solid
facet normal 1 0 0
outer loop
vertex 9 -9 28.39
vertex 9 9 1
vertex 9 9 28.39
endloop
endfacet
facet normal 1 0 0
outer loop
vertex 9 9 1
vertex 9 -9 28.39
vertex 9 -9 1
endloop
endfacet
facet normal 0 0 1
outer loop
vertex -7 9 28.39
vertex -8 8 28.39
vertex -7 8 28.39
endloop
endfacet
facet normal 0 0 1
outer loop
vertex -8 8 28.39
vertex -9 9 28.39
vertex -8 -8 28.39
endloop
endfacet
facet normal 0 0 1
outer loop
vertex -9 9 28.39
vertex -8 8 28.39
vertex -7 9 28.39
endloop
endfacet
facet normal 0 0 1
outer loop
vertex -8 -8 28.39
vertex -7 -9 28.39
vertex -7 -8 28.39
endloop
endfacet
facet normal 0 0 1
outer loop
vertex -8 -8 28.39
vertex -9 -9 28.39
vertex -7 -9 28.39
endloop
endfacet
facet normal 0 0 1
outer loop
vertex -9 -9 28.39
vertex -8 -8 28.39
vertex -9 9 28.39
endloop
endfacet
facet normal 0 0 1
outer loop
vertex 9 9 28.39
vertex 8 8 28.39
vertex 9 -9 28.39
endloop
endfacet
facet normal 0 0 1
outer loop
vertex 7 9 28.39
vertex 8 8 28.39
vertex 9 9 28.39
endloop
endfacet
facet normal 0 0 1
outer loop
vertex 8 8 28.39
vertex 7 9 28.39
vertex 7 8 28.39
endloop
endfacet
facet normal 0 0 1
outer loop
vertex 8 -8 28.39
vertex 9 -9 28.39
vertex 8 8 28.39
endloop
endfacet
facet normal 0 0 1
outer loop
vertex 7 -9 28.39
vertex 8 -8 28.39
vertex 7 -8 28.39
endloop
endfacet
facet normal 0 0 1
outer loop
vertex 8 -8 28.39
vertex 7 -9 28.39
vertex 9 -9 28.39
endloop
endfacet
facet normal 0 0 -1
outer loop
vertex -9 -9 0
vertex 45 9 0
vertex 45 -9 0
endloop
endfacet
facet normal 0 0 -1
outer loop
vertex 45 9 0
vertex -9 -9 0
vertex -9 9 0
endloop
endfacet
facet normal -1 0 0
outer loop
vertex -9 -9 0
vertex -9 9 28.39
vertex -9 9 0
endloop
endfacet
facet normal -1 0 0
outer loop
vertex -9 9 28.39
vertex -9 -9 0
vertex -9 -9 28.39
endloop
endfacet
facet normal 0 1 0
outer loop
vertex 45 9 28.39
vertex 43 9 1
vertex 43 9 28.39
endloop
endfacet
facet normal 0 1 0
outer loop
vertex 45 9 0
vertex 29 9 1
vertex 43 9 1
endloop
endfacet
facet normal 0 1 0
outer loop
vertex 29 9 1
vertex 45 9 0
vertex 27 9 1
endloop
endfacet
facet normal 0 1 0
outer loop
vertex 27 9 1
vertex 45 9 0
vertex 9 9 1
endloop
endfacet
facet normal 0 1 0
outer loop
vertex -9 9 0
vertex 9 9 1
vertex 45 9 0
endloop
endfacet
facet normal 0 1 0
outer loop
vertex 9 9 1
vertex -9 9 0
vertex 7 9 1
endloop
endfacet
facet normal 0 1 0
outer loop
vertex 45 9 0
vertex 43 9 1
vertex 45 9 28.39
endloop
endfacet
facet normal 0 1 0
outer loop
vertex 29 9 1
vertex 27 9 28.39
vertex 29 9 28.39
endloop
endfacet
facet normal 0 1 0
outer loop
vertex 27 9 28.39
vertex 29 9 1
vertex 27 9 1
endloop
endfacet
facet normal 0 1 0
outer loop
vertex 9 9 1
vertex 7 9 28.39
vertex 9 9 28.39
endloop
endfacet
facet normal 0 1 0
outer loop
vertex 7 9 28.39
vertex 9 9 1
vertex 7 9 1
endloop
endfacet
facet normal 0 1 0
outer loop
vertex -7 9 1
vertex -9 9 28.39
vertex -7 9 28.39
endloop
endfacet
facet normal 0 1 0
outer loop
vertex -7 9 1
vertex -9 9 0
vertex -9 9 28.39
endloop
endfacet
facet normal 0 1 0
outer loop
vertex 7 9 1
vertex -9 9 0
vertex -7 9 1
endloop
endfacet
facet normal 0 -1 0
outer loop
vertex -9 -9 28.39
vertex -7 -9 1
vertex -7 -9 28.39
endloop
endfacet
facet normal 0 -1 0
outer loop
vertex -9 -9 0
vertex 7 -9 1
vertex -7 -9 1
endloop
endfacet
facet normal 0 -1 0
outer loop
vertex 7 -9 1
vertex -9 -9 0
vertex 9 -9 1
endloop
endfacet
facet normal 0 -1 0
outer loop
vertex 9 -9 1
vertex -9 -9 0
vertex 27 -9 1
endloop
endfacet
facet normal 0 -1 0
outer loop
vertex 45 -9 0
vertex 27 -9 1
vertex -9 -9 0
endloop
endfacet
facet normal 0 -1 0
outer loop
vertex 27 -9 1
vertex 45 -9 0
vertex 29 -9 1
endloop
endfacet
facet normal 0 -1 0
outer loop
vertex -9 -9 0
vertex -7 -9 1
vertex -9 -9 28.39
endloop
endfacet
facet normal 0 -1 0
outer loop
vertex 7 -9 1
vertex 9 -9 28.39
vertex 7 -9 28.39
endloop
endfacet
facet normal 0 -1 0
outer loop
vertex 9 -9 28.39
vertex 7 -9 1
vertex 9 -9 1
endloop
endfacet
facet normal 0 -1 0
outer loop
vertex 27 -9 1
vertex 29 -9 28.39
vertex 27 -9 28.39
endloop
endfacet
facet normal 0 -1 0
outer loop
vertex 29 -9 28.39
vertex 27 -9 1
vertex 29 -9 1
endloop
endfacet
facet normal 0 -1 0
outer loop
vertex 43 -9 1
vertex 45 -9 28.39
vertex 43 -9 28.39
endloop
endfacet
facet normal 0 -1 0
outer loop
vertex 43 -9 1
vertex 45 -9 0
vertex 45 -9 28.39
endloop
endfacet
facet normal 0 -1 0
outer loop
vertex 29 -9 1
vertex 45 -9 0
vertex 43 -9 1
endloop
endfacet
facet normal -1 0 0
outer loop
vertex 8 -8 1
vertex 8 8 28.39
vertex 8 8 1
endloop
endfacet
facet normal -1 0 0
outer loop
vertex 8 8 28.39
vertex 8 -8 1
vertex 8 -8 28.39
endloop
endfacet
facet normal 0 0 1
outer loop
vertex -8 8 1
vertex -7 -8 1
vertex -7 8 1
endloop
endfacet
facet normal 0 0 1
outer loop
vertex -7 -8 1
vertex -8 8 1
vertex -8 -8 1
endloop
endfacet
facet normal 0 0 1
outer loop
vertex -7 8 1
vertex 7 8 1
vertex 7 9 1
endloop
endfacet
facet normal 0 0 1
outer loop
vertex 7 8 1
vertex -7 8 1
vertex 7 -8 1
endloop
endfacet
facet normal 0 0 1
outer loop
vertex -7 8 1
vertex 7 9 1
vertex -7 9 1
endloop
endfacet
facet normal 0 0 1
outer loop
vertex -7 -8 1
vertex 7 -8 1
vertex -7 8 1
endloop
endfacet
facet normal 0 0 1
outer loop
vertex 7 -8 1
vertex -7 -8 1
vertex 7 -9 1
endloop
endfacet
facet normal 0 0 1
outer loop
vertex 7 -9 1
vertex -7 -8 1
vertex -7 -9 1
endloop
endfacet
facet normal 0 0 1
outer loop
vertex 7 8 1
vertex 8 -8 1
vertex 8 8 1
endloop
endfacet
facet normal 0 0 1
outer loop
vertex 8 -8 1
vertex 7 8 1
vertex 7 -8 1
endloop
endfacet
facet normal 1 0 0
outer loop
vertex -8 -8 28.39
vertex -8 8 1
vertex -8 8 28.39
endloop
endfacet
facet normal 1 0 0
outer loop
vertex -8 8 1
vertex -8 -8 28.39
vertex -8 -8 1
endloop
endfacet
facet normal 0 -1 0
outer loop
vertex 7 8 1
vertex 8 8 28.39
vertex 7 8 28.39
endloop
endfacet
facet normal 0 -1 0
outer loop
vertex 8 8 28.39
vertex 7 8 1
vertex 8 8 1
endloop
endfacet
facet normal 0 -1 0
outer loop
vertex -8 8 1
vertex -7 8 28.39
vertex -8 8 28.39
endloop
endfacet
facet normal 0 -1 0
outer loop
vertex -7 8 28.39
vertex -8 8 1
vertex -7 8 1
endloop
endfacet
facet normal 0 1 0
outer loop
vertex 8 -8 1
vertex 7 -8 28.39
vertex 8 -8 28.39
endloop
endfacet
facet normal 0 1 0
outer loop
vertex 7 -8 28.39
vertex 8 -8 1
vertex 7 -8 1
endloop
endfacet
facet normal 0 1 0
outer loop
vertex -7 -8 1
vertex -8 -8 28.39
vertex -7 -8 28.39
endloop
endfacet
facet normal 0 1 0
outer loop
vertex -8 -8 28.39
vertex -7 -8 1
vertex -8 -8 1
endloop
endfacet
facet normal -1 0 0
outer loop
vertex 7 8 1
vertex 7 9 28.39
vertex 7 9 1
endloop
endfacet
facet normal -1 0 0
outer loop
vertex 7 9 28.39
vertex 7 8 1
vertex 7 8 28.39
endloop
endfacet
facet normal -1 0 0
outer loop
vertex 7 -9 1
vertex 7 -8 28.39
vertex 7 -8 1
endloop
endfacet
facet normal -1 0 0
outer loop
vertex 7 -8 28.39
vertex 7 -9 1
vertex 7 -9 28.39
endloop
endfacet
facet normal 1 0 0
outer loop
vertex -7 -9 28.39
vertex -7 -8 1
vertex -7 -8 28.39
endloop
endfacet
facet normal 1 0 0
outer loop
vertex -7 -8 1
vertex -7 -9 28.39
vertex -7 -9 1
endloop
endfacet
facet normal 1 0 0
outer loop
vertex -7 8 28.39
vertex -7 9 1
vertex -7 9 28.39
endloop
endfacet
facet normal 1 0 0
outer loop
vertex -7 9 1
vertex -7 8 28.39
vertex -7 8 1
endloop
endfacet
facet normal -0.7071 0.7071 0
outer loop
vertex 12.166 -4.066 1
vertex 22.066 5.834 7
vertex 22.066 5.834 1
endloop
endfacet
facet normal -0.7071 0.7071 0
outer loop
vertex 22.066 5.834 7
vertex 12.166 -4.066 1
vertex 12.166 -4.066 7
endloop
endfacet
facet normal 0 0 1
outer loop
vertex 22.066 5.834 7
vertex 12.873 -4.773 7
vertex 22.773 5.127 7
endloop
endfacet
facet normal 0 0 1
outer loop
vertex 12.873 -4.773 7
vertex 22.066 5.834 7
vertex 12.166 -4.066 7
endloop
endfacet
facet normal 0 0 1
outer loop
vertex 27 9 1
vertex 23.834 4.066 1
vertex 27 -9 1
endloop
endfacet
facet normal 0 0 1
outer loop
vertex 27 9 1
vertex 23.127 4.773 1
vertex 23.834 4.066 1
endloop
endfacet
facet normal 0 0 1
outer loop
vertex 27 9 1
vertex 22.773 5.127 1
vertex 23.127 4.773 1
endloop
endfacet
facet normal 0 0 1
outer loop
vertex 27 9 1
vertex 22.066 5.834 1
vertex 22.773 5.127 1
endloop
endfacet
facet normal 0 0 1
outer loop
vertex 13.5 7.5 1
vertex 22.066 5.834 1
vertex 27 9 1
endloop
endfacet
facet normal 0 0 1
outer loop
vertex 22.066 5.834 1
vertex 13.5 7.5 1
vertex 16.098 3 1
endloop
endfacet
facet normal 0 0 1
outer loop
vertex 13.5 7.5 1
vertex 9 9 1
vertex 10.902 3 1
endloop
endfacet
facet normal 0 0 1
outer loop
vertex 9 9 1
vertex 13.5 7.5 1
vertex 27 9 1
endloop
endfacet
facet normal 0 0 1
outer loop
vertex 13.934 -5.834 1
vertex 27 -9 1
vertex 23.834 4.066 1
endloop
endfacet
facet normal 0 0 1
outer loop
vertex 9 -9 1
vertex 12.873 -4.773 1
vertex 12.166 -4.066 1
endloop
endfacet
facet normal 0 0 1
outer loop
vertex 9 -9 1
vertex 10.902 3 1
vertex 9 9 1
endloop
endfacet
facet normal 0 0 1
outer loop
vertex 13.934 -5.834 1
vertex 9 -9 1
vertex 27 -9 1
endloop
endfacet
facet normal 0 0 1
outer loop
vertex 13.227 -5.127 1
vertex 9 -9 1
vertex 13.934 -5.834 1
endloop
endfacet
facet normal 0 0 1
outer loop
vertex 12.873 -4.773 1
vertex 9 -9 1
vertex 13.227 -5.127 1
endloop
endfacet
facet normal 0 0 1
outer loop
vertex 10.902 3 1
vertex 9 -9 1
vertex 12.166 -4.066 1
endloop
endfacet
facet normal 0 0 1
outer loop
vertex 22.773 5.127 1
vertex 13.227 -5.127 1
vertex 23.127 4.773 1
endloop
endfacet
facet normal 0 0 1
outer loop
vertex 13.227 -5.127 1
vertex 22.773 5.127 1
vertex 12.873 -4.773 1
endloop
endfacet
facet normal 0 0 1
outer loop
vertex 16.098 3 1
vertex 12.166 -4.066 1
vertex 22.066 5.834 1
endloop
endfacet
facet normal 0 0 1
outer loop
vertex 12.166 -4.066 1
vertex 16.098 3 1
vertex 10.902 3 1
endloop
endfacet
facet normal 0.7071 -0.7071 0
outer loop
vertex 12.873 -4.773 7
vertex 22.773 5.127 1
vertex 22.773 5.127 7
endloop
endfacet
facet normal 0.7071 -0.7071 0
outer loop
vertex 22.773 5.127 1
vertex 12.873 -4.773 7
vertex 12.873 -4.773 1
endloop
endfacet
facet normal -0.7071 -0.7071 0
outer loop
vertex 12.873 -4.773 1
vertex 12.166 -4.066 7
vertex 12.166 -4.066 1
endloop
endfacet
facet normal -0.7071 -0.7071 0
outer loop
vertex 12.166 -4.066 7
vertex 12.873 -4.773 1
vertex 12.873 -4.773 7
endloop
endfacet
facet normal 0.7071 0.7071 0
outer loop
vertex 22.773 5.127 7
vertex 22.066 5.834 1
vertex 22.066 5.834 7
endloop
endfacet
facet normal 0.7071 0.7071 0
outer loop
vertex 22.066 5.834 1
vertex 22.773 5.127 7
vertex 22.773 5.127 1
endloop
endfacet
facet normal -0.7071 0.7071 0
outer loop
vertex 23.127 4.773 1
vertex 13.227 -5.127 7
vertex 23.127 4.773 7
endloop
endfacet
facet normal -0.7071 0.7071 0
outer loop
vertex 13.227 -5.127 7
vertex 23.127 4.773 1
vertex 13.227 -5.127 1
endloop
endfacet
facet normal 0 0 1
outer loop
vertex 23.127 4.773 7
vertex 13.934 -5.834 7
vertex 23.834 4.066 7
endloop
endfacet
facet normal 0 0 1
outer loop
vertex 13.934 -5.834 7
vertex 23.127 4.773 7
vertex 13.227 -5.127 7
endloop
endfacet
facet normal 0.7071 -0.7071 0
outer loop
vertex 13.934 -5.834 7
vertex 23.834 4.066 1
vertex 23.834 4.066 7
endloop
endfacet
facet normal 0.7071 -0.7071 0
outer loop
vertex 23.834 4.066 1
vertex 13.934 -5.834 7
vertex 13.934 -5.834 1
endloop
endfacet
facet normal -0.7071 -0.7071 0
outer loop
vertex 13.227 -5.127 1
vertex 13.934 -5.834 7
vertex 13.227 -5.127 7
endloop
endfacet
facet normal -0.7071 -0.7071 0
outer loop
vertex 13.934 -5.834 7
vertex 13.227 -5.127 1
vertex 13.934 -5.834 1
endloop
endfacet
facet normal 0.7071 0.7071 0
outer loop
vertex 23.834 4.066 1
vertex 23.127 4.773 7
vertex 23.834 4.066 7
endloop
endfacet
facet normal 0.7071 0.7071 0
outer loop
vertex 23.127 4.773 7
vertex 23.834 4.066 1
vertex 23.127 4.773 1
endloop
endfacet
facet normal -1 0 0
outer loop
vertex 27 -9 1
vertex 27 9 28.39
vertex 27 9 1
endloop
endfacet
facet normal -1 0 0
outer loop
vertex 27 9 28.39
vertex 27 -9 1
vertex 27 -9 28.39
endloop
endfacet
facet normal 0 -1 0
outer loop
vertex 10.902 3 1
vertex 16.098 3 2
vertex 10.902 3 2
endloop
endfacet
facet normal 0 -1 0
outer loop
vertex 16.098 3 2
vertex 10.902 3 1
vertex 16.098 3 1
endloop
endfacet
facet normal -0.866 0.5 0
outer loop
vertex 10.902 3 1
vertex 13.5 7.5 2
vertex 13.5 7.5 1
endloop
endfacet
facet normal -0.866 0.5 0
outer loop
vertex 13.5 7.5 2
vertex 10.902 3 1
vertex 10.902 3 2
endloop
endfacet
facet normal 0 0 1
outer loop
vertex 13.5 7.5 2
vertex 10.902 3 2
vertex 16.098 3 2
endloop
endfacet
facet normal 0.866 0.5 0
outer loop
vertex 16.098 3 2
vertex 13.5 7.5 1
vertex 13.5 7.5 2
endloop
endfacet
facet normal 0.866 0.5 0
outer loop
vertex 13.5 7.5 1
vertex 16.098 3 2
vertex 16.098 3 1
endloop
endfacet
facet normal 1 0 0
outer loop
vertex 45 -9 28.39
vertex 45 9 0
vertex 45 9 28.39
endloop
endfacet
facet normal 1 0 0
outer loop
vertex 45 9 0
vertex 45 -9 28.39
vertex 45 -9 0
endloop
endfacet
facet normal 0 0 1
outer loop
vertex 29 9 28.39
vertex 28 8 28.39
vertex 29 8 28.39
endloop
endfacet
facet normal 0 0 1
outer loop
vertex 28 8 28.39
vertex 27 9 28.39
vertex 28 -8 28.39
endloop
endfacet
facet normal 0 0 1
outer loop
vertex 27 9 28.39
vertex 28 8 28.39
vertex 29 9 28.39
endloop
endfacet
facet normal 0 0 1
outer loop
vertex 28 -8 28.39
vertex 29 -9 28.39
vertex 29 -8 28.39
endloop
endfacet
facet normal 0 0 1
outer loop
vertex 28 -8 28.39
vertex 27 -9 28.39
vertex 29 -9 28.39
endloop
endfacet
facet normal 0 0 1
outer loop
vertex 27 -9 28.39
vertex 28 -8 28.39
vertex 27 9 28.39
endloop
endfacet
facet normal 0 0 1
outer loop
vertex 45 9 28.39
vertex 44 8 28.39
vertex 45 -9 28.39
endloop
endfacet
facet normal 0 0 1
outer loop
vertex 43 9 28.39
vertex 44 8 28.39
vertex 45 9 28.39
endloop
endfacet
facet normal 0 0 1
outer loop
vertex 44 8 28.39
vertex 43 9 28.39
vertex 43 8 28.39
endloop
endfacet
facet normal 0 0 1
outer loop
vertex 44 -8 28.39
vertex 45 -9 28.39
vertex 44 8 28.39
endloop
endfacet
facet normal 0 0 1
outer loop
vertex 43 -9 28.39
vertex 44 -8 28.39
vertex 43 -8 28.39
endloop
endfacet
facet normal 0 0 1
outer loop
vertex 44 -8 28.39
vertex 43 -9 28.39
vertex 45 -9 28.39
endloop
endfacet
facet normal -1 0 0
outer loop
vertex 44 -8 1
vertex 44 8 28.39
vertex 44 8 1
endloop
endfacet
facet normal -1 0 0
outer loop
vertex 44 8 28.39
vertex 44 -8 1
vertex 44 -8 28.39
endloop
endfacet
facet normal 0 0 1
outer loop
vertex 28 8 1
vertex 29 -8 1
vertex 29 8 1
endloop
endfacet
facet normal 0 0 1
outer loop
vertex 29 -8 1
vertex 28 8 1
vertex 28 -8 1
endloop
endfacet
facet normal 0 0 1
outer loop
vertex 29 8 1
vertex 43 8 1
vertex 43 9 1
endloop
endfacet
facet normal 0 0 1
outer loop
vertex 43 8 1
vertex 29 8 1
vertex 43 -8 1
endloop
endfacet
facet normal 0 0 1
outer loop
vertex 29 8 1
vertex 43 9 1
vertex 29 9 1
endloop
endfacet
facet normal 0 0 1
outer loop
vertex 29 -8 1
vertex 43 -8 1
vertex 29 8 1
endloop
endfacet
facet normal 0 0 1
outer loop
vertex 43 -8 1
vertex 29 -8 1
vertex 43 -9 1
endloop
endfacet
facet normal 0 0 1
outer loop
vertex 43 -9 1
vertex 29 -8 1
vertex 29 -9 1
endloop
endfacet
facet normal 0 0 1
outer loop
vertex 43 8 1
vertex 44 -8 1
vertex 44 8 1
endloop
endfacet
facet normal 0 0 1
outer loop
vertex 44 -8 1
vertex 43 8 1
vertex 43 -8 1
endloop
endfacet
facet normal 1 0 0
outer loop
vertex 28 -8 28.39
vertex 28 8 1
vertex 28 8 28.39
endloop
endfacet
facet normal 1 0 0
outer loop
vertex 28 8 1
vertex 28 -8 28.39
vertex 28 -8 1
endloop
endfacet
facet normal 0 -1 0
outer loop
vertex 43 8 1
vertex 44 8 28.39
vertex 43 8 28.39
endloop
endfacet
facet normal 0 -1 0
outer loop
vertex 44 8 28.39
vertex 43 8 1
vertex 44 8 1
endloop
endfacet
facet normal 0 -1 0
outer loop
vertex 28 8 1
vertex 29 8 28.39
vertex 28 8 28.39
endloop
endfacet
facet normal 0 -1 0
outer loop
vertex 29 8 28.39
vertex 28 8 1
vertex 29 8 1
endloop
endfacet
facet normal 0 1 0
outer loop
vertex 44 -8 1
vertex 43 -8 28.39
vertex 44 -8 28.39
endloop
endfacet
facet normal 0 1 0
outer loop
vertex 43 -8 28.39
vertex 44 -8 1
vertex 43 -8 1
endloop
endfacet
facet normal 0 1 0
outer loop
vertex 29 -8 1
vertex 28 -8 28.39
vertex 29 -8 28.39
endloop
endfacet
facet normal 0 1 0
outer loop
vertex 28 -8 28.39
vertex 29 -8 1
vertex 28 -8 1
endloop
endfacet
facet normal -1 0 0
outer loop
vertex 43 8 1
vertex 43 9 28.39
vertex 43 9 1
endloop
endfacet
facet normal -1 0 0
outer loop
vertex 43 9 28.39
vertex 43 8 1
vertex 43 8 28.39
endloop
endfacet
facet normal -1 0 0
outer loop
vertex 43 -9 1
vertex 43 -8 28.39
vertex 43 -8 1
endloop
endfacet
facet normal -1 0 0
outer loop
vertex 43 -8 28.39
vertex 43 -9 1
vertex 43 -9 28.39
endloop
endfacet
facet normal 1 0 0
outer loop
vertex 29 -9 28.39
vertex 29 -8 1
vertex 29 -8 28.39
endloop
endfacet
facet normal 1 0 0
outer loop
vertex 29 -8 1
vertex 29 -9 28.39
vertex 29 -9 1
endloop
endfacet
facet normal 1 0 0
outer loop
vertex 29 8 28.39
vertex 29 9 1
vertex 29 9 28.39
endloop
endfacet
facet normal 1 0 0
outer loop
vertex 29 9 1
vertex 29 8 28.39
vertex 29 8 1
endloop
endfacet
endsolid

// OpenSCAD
sizeDice = 16 ;

t = 1;

sizeX = sizeDice + 2*t;
sizeY = sizeDice + 2*t;
sizeZ = sizeDice + t;

holderX = 1;
holderY = 14;
holderZ = 6;
holderAngle = 45;
holderDistance = 0.5;

module dice(numberDices = 1, angle = 0)
{
    rotate([0, 0, angle]) translate([-sizeX/2, -sizeY/2, 0]) difference()
    {
        cube([sizeX, sizeY, sizeZ * (numberDices - 0.33)]);
        translate([t, t, t]) cube([sizeDice, sizeDice, sizeDice * numberDices]);
        translate([2*t, 0, t]) cube([sizeDice - 2*t, sizeDice + 2*t, sizeDice * numberDices]);
    }
}

module holder(showDirection = false, angle = 0)
{
    rotate([0, 0, angle])
    {
        translate([0, 0, t/2]) cube([sizeX, sizeY, t], true);
        translate([0, 0, holderZ/2+t]) rotate([0, 0, holderAngle])
        {
            union() {
                translate([(holderX+holderDistance)/2, 0, 0]) cube([holderX, holderY, holderZ], true);
                translate([-(holderX+holderDistance)/2, 0, 0]) cube([holderX, holderY, holderZ], true);
            }
        }
        if (showDirection)
        {
            translate([sizeX/2 - 3*1.5, sizeY/2 - 3*1.5, t]) cylinder($fn = 3, h = t, r = 3, true);
        }
    }
}

module piece(name)
{
    for (position = [0:1:len(name)-1] )
    {
        if (name[position] == "S")
        {
            translate([0, 0, 0]) dice(2);
            translate([sizeX, 0, 0]) holder();
            translate([sizeX *2, 0, 0]) dice(2);
            translate([sizeX *0.5, sizeY, 0]) rotate([0, 0, 90]) dice(2);
            translate([sizeX *0.5, -sizeY, 0]) rotate([0, 0, 90]) dice(2);
        }
        else if (name[position] == "A")
        {
            translate([sizeX * position, 0, 0]) holder(true, 0);
        }
        else if (name[position] == "a")
        {
            translate([sizeX * position, 0, 0]) holder(true, 90);
        }
        else if (name[position] == "B")
        {
            translate([sizeX * position, 0, 0]) holder(false, 0);
        }
        else if (name[position] == "b")
        {
            translate([sizeX * position, 0, 0]) holder(false, 90);
        }
        else if (name[position] == "V")
        {
            translate([sizeX * position, 0, 0]) dice(1, 0);
        }
        else if (name[position] == "v")
        {
            translate([sizeX * position, 0, 0]) dice(1, 90);
        }
        else if (name[position] == "W")
        {
            translate([sizeX * position, 0, 0]) dice(2, 0);
        }
        else if (name[position] == "w")
        {
            translate([sizeX * position, 0, 0]) dice(2, 90);
        }
    }
}

// A, B, AV, AW, WAW, AWB, WAWW, WAWWW
piece("WaW");
